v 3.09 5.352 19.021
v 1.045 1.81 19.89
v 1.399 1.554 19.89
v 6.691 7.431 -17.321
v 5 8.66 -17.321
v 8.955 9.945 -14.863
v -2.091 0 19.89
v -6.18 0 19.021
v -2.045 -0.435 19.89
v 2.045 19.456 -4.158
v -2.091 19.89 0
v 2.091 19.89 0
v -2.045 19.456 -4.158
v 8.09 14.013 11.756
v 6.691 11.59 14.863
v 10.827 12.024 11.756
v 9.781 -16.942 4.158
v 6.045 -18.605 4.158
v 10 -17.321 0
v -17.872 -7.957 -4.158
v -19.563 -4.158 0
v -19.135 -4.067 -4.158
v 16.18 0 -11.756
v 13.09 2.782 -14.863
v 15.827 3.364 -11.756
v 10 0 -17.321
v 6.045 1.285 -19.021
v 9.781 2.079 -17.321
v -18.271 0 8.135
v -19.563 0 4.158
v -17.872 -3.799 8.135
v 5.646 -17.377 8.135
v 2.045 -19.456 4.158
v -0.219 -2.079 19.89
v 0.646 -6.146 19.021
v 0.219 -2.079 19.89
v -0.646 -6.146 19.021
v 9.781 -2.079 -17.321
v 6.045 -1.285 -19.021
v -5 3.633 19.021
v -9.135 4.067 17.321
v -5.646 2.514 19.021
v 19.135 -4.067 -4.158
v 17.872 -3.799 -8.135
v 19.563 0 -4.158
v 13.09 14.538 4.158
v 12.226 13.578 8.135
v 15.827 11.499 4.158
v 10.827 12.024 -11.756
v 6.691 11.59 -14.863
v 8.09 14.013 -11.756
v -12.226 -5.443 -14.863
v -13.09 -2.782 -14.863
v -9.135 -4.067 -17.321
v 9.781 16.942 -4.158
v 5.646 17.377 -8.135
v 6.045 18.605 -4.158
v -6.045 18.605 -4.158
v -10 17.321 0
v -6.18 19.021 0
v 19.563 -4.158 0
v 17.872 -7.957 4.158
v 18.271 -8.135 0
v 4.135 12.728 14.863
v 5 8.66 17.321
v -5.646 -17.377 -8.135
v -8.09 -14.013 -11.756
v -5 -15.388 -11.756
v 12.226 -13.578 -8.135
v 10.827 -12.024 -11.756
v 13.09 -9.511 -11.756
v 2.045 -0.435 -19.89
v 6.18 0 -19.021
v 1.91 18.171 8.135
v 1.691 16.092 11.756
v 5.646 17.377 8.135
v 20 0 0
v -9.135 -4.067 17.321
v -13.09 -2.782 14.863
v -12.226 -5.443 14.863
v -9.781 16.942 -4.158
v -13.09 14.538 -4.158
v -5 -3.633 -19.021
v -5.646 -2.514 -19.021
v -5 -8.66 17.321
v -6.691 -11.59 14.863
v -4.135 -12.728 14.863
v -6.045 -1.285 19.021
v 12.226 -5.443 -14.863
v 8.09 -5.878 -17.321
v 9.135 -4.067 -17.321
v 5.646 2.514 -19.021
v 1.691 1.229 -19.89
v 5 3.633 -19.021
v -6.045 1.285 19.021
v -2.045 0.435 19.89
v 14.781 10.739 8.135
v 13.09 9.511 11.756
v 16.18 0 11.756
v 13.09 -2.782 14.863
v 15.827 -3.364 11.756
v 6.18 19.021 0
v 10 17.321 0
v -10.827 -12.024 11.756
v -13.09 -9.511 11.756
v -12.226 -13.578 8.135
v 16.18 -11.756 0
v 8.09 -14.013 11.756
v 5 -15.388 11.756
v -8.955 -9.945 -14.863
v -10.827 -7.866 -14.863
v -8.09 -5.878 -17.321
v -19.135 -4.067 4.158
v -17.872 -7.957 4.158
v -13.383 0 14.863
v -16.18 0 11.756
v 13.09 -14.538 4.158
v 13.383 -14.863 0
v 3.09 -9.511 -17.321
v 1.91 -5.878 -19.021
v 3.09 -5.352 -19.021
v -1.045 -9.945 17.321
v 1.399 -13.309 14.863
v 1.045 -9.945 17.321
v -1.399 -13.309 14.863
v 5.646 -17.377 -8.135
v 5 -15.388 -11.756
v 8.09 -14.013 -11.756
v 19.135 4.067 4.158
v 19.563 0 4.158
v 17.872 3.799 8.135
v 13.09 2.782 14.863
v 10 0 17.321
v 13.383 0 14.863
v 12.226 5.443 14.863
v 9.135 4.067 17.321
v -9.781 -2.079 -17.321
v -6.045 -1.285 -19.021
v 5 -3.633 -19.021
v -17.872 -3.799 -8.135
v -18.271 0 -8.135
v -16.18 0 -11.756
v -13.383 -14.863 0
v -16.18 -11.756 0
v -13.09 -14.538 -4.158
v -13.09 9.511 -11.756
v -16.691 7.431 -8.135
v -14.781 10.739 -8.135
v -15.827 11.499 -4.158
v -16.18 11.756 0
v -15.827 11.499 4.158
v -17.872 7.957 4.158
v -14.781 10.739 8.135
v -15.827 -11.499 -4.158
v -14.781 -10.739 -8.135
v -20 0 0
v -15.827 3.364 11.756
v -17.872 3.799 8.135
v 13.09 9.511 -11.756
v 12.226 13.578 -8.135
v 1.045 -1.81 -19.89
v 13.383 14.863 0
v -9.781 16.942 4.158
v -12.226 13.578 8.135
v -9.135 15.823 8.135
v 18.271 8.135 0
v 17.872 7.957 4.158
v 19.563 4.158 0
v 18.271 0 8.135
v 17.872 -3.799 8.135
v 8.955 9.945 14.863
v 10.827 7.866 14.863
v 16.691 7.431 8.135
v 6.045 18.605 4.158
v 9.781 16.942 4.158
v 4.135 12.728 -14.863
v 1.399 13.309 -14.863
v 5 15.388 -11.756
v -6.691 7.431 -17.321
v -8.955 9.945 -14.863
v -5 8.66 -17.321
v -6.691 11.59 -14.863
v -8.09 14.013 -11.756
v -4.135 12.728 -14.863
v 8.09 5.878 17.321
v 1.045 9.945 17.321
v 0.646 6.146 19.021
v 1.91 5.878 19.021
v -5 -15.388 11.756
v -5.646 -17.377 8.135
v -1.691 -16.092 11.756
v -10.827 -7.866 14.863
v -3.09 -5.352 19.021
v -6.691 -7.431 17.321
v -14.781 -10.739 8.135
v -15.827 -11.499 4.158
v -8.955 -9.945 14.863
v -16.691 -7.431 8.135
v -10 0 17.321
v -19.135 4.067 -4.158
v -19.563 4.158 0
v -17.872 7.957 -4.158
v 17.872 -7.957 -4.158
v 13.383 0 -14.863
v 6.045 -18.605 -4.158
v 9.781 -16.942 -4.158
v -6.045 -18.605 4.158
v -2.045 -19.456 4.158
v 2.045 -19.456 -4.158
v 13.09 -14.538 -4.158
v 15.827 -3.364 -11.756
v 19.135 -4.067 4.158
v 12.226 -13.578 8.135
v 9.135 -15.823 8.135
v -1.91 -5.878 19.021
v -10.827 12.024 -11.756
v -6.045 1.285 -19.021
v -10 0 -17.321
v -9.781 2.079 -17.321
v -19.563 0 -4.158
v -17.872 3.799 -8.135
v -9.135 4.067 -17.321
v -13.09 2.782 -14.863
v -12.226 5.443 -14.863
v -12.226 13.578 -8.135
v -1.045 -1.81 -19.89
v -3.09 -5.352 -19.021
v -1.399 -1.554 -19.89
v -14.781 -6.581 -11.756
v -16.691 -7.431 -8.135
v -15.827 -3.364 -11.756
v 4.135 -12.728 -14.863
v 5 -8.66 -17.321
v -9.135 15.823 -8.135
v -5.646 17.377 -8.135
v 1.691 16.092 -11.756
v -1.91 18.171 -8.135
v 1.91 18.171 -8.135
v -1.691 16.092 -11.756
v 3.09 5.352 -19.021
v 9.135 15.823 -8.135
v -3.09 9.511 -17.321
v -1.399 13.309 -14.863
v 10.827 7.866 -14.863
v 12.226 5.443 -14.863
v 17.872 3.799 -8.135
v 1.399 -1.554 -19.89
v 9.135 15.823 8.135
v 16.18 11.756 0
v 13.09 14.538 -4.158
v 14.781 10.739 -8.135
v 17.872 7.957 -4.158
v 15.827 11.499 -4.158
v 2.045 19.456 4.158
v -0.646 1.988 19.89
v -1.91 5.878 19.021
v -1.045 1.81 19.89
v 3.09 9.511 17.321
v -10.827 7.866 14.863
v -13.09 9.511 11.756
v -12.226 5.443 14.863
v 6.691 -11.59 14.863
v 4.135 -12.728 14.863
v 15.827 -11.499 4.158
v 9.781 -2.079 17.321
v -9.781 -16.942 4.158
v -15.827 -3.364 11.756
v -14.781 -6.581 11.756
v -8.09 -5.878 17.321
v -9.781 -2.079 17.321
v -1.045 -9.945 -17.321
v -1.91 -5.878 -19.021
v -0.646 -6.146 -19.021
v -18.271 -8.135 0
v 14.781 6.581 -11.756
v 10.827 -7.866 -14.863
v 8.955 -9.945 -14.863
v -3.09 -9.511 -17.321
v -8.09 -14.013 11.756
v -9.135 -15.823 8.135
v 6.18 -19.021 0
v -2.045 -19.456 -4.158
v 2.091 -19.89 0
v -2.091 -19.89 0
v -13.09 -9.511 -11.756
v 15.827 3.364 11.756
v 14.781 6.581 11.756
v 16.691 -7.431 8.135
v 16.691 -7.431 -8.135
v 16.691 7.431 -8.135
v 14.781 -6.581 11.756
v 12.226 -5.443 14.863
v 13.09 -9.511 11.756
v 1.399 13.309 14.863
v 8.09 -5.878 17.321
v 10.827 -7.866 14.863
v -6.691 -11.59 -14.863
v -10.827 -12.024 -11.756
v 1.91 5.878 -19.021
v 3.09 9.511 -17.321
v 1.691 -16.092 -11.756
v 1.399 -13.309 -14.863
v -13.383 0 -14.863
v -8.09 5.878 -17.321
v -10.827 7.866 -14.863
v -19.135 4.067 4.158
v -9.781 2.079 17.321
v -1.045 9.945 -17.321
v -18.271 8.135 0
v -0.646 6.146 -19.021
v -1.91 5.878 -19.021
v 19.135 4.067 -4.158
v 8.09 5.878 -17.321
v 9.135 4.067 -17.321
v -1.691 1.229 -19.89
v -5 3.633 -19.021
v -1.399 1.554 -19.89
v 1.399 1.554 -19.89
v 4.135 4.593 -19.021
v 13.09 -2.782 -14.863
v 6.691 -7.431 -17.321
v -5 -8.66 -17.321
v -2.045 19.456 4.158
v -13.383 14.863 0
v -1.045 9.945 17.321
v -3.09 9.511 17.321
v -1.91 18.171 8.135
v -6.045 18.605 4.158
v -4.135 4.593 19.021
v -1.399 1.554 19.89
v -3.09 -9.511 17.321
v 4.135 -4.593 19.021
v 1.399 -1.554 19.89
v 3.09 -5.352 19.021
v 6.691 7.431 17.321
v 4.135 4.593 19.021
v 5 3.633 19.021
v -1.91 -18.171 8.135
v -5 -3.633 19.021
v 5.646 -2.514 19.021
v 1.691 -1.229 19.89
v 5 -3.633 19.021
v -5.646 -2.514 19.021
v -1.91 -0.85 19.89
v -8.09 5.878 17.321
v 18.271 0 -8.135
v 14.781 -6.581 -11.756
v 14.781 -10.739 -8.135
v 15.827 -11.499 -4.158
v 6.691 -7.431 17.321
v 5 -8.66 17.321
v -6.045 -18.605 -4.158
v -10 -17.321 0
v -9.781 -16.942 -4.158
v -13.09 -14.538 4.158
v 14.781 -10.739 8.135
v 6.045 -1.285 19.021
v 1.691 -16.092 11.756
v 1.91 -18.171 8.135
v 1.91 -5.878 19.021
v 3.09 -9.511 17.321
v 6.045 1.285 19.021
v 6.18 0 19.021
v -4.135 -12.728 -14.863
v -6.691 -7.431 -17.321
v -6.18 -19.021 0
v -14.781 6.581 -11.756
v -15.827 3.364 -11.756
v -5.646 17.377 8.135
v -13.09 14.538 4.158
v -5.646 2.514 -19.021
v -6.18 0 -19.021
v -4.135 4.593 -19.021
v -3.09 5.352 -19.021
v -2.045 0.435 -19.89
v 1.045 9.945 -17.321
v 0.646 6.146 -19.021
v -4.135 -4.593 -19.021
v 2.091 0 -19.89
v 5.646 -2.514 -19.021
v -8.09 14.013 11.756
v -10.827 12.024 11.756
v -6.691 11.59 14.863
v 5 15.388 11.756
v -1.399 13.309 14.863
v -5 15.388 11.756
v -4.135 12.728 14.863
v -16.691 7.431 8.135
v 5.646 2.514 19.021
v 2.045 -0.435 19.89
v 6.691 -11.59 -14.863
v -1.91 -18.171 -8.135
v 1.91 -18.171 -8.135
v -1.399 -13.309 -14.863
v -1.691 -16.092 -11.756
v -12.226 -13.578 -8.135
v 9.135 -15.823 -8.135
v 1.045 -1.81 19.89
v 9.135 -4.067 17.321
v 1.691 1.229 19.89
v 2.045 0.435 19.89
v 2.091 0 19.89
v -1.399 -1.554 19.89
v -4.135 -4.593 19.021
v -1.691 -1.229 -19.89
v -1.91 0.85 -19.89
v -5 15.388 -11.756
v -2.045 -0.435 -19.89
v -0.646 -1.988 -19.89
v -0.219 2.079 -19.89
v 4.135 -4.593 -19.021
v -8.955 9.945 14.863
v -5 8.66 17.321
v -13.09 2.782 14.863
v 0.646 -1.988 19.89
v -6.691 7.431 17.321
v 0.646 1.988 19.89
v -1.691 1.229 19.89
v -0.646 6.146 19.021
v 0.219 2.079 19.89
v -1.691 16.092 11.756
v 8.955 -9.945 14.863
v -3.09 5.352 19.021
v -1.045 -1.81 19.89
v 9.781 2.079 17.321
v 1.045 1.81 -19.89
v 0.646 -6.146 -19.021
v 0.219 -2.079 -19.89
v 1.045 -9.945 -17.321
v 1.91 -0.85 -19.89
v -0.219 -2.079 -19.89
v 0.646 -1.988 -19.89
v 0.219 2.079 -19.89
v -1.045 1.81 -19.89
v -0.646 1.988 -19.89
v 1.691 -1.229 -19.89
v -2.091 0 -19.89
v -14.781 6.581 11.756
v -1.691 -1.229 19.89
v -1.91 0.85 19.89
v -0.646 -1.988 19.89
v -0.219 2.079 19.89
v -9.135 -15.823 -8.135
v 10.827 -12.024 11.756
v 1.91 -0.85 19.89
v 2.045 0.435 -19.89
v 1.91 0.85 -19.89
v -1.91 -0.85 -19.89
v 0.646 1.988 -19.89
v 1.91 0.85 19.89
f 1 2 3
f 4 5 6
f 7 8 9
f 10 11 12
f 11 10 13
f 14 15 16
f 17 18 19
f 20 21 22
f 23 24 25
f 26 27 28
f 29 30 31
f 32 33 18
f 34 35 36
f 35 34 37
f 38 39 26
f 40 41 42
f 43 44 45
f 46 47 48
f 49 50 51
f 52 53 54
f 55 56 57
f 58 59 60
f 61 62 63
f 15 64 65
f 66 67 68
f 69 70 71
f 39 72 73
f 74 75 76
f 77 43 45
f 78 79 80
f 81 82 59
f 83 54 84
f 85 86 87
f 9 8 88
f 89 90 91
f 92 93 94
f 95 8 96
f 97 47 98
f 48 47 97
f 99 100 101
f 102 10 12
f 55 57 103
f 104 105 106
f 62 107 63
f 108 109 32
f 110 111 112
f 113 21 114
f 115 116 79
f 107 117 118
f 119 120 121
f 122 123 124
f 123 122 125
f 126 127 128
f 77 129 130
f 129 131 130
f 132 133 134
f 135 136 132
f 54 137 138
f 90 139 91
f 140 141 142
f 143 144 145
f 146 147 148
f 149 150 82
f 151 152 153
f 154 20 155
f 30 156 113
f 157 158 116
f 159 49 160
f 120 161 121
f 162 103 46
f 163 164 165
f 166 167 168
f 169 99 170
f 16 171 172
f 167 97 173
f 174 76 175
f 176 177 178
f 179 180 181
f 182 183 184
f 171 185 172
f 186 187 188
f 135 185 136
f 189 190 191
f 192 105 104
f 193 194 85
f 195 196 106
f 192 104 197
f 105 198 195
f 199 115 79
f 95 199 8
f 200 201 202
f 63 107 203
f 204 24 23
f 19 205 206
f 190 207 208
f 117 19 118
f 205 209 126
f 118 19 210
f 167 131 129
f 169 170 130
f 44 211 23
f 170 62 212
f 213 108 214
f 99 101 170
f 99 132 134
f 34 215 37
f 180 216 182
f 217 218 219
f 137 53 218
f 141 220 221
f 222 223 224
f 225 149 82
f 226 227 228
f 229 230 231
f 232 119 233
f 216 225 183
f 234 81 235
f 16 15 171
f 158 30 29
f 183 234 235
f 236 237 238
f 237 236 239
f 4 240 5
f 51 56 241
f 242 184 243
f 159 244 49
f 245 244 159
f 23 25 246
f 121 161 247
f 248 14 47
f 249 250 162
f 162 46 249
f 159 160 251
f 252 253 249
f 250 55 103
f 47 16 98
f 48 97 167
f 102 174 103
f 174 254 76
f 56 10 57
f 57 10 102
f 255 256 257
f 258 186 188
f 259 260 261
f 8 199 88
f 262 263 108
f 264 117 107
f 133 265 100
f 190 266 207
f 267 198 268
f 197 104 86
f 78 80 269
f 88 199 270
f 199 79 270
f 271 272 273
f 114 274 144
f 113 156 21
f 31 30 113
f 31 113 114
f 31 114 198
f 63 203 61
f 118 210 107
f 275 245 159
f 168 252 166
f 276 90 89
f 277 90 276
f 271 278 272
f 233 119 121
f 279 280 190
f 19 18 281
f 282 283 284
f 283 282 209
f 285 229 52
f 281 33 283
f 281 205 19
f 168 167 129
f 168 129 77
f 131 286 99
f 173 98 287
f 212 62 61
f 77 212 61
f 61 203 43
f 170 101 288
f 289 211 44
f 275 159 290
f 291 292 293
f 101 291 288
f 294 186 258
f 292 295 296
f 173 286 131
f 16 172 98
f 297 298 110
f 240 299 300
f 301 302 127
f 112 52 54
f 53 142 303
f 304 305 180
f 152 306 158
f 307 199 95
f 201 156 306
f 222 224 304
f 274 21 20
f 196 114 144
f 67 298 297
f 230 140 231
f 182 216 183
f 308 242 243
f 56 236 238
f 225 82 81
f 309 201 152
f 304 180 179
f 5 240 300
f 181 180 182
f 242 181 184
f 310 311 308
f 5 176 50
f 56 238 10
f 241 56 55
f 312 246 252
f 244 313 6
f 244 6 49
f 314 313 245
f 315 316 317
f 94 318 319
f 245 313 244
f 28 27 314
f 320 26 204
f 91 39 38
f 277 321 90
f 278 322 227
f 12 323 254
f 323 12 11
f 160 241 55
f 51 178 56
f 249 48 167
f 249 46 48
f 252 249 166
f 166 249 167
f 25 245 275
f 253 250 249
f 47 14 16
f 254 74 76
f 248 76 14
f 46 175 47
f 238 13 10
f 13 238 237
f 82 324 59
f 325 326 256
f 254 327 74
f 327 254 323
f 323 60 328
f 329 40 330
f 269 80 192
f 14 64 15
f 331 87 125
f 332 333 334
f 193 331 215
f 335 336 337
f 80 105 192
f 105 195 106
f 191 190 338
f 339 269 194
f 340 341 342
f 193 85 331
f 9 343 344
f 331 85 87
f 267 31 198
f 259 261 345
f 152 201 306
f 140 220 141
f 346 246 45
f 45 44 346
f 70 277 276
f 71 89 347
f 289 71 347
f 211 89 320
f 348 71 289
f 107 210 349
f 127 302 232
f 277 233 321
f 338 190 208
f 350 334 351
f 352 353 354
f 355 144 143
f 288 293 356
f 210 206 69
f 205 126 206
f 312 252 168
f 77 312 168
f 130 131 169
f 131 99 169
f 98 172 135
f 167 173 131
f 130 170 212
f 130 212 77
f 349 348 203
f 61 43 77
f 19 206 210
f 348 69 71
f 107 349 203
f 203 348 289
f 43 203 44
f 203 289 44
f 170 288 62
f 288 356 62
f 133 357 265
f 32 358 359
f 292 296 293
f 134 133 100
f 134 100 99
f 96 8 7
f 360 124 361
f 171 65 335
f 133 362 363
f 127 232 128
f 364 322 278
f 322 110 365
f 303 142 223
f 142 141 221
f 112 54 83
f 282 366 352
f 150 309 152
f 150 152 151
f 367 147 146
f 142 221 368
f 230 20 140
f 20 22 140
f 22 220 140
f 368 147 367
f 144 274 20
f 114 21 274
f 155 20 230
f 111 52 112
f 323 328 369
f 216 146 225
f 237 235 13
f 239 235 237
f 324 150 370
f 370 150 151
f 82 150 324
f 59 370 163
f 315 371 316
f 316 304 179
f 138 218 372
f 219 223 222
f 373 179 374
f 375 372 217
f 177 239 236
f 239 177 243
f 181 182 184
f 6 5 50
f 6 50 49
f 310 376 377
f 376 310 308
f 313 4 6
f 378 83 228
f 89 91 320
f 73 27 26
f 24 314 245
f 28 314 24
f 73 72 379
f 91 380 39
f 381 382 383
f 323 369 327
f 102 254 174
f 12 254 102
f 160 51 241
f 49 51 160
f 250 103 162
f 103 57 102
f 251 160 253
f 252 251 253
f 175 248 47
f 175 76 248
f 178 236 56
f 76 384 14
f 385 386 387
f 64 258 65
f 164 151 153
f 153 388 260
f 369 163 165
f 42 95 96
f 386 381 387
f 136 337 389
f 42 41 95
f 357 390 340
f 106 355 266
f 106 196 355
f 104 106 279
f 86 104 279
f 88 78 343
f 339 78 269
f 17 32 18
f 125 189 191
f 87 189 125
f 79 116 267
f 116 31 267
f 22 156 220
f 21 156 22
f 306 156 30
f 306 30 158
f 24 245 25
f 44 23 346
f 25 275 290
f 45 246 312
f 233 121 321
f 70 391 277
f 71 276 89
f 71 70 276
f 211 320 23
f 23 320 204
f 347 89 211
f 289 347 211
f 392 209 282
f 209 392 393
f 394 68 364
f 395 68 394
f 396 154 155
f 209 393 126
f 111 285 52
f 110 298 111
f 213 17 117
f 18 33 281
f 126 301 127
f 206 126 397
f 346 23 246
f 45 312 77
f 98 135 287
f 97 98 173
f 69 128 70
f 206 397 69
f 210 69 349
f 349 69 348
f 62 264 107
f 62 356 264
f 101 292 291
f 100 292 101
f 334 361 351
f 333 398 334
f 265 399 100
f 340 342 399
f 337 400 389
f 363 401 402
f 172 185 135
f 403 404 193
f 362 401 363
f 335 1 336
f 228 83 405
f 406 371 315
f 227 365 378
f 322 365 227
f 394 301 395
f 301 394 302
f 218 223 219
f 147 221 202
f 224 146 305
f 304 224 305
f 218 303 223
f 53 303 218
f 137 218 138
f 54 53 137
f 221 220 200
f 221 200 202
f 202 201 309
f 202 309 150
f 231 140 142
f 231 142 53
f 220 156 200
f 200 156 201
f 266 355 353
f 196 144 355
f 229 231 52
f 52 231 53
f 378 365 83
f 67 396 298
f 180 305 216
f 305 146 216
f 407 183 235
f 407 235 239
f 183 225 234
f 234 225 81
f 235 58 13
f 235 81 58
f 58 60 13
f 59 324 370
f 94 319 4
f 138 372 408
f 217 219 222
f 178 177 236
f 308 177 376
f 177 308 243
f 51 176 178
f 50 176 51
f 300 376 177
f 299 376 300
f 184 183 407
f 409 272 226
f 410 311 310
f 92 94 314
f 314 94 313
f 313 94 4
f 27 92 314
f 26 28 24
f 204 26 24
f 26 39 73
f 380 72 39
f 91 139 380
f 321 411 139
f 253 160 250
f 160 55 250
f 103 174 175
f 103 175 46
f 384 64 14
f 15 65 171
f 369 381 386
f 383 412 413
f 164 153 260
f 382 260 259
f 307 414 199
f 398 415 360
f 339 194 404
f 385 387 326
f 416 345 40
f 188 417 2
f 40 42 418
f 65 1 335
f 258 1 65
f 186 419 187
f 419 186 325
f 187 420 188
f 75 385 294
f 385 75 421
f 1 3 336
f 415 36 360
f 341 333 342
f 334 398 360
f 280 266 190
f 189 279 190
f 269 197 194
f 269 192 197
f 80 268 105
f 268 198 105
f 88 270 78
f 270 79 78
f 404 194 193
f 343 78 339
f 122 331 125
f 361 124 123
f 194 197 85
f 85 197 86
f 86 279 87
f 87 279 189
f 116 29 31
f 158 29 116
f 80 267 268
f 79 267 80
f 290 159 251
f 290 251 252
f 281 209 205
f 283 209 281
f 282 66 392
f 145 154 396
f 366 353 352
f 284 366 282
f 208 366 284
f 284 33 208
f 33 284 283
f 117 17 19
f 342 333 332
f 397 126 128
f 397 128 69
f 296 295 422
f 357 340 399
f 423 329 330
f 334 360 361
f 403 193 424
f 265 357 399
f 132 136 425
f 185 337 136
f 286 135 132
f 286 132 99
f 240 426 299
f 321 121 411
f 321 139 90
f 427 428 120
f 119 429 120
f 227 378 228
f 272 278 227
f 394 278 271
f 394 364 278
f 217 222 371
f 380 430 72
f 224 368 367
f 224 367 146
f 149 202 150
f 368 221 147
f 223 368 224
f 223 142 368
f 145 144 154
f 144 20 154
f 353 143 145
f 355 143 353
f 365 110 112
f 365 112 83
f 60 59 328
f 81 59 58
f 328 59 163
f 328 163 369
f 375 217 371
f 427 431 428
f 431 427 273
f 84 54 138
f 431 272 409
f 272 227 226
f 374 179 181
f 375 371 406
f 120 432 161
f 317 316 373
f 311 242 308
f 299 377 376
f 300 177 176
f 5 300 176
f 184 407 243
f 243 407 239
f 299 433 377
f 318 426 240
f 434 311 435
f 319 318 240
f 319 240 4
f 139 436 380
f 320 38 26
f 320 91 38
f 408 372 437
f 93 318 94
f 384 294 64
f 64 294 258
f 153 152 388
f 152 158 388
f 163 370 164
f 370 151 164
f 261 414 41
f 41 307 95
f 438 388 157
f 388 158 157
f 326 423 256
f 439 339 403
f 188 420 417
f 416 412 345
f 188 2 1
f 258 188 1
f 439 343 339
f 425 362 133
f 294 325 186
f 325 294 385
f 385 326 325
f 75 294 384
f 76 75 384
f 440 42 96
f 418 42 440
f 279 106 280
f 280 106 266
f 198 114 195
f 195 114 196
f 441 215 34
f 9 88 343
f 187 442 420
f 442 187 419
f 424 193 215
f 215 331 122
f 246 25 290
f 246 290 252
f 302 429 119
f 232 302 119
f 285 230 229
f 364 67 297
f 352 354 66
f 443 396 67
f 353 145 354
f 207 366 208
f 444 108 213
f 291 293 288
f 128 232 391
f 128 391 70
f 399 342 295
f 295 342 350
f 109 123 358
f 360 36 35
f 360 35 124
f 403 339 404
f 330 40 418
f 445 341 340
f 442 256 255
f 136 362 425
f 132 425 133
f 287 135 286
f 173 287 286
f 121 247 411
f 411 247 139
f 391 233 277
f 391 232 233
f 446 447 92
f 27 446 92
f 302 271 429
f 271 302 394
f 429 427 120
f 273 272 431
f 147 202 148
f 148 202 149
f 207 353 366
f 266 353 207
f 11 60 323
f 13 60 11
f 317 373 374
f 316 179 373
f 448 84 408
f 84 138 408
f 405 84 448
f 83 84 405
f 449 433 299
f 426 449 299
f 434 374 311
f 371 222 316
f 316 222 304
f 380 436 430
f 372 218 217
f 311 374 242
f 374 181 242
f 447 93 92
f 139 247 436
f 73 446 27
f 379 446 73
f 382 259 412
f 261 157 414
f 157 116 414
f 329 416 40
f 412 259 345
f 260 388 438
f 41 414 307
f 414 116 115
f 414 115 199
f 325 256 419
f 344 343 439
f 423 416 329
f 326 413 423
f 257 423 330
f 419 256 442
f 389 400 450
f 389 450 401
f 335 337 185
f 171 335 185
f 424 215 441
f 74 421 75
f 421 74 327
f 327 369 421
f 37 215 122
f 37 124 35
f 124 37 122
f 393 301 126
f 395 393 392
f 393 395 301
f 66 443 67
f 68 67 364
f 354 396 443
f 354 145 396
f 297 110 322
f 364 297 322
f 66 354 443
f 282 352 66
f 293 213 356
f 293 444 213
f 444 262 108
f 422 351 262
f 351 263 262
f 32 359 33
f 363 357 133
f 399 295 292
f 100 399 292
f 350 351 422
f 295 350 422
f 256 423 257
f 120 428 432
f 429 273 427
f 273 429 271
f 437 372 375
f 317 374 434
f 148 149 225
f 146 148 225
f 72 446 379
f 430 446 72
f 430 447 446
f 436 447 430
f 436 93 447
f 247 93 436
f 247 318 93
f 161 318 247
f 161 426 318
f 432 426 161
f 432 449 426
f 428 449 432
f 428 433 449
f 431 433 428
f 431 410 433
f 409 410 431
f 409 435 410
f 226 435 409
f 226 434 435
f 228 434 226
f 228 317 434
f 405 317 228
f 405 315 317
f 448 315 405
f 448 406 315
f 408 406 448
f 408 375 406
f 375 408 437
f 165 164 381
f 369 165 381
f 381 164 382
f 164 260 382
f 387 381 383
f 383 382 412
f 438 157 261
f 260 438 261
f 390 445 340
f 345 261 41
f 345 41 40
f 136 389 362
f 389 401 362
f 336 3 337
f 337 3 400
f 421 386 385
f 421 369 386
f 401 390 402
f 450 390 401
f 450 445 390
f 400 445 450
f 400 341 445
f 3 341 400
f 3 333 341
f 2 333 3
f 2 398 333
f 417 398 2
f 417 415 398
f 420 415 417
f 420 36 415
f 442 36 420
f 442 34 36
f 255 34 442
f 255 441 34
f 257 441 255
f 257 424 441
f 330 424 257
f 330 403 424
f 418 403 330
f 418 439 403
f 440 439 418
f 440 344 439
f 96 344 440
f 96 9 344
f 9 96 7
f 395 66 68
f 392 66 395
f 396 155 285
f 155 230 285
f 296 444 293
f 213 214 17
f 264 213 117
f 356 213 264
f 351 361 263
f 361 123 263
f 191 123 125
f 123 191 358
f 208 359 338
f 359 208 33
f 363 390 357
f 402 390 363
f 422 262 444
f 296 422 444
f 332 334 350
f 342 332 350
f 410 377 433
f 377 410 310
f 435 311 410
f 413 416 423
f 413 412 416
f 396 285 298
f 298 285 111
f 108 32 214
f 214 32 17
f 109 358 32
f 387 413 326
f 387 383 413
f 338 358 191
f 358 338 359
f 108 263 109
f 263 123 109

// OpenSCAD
// file: inc4.scad
a = 4;

module foo(r) {
  sphere (a*r);
}
foo(5);
// file: inc3.scad
include <inc4.scad>

a = 4;

module foo(r) {
  sphere (a*r);
}
foo(5);
// main file
include <inc3.scad>
include <inc4.scad>

a = 4;

module foo(r) {
  sphere (a*r);
}
foo(5);
